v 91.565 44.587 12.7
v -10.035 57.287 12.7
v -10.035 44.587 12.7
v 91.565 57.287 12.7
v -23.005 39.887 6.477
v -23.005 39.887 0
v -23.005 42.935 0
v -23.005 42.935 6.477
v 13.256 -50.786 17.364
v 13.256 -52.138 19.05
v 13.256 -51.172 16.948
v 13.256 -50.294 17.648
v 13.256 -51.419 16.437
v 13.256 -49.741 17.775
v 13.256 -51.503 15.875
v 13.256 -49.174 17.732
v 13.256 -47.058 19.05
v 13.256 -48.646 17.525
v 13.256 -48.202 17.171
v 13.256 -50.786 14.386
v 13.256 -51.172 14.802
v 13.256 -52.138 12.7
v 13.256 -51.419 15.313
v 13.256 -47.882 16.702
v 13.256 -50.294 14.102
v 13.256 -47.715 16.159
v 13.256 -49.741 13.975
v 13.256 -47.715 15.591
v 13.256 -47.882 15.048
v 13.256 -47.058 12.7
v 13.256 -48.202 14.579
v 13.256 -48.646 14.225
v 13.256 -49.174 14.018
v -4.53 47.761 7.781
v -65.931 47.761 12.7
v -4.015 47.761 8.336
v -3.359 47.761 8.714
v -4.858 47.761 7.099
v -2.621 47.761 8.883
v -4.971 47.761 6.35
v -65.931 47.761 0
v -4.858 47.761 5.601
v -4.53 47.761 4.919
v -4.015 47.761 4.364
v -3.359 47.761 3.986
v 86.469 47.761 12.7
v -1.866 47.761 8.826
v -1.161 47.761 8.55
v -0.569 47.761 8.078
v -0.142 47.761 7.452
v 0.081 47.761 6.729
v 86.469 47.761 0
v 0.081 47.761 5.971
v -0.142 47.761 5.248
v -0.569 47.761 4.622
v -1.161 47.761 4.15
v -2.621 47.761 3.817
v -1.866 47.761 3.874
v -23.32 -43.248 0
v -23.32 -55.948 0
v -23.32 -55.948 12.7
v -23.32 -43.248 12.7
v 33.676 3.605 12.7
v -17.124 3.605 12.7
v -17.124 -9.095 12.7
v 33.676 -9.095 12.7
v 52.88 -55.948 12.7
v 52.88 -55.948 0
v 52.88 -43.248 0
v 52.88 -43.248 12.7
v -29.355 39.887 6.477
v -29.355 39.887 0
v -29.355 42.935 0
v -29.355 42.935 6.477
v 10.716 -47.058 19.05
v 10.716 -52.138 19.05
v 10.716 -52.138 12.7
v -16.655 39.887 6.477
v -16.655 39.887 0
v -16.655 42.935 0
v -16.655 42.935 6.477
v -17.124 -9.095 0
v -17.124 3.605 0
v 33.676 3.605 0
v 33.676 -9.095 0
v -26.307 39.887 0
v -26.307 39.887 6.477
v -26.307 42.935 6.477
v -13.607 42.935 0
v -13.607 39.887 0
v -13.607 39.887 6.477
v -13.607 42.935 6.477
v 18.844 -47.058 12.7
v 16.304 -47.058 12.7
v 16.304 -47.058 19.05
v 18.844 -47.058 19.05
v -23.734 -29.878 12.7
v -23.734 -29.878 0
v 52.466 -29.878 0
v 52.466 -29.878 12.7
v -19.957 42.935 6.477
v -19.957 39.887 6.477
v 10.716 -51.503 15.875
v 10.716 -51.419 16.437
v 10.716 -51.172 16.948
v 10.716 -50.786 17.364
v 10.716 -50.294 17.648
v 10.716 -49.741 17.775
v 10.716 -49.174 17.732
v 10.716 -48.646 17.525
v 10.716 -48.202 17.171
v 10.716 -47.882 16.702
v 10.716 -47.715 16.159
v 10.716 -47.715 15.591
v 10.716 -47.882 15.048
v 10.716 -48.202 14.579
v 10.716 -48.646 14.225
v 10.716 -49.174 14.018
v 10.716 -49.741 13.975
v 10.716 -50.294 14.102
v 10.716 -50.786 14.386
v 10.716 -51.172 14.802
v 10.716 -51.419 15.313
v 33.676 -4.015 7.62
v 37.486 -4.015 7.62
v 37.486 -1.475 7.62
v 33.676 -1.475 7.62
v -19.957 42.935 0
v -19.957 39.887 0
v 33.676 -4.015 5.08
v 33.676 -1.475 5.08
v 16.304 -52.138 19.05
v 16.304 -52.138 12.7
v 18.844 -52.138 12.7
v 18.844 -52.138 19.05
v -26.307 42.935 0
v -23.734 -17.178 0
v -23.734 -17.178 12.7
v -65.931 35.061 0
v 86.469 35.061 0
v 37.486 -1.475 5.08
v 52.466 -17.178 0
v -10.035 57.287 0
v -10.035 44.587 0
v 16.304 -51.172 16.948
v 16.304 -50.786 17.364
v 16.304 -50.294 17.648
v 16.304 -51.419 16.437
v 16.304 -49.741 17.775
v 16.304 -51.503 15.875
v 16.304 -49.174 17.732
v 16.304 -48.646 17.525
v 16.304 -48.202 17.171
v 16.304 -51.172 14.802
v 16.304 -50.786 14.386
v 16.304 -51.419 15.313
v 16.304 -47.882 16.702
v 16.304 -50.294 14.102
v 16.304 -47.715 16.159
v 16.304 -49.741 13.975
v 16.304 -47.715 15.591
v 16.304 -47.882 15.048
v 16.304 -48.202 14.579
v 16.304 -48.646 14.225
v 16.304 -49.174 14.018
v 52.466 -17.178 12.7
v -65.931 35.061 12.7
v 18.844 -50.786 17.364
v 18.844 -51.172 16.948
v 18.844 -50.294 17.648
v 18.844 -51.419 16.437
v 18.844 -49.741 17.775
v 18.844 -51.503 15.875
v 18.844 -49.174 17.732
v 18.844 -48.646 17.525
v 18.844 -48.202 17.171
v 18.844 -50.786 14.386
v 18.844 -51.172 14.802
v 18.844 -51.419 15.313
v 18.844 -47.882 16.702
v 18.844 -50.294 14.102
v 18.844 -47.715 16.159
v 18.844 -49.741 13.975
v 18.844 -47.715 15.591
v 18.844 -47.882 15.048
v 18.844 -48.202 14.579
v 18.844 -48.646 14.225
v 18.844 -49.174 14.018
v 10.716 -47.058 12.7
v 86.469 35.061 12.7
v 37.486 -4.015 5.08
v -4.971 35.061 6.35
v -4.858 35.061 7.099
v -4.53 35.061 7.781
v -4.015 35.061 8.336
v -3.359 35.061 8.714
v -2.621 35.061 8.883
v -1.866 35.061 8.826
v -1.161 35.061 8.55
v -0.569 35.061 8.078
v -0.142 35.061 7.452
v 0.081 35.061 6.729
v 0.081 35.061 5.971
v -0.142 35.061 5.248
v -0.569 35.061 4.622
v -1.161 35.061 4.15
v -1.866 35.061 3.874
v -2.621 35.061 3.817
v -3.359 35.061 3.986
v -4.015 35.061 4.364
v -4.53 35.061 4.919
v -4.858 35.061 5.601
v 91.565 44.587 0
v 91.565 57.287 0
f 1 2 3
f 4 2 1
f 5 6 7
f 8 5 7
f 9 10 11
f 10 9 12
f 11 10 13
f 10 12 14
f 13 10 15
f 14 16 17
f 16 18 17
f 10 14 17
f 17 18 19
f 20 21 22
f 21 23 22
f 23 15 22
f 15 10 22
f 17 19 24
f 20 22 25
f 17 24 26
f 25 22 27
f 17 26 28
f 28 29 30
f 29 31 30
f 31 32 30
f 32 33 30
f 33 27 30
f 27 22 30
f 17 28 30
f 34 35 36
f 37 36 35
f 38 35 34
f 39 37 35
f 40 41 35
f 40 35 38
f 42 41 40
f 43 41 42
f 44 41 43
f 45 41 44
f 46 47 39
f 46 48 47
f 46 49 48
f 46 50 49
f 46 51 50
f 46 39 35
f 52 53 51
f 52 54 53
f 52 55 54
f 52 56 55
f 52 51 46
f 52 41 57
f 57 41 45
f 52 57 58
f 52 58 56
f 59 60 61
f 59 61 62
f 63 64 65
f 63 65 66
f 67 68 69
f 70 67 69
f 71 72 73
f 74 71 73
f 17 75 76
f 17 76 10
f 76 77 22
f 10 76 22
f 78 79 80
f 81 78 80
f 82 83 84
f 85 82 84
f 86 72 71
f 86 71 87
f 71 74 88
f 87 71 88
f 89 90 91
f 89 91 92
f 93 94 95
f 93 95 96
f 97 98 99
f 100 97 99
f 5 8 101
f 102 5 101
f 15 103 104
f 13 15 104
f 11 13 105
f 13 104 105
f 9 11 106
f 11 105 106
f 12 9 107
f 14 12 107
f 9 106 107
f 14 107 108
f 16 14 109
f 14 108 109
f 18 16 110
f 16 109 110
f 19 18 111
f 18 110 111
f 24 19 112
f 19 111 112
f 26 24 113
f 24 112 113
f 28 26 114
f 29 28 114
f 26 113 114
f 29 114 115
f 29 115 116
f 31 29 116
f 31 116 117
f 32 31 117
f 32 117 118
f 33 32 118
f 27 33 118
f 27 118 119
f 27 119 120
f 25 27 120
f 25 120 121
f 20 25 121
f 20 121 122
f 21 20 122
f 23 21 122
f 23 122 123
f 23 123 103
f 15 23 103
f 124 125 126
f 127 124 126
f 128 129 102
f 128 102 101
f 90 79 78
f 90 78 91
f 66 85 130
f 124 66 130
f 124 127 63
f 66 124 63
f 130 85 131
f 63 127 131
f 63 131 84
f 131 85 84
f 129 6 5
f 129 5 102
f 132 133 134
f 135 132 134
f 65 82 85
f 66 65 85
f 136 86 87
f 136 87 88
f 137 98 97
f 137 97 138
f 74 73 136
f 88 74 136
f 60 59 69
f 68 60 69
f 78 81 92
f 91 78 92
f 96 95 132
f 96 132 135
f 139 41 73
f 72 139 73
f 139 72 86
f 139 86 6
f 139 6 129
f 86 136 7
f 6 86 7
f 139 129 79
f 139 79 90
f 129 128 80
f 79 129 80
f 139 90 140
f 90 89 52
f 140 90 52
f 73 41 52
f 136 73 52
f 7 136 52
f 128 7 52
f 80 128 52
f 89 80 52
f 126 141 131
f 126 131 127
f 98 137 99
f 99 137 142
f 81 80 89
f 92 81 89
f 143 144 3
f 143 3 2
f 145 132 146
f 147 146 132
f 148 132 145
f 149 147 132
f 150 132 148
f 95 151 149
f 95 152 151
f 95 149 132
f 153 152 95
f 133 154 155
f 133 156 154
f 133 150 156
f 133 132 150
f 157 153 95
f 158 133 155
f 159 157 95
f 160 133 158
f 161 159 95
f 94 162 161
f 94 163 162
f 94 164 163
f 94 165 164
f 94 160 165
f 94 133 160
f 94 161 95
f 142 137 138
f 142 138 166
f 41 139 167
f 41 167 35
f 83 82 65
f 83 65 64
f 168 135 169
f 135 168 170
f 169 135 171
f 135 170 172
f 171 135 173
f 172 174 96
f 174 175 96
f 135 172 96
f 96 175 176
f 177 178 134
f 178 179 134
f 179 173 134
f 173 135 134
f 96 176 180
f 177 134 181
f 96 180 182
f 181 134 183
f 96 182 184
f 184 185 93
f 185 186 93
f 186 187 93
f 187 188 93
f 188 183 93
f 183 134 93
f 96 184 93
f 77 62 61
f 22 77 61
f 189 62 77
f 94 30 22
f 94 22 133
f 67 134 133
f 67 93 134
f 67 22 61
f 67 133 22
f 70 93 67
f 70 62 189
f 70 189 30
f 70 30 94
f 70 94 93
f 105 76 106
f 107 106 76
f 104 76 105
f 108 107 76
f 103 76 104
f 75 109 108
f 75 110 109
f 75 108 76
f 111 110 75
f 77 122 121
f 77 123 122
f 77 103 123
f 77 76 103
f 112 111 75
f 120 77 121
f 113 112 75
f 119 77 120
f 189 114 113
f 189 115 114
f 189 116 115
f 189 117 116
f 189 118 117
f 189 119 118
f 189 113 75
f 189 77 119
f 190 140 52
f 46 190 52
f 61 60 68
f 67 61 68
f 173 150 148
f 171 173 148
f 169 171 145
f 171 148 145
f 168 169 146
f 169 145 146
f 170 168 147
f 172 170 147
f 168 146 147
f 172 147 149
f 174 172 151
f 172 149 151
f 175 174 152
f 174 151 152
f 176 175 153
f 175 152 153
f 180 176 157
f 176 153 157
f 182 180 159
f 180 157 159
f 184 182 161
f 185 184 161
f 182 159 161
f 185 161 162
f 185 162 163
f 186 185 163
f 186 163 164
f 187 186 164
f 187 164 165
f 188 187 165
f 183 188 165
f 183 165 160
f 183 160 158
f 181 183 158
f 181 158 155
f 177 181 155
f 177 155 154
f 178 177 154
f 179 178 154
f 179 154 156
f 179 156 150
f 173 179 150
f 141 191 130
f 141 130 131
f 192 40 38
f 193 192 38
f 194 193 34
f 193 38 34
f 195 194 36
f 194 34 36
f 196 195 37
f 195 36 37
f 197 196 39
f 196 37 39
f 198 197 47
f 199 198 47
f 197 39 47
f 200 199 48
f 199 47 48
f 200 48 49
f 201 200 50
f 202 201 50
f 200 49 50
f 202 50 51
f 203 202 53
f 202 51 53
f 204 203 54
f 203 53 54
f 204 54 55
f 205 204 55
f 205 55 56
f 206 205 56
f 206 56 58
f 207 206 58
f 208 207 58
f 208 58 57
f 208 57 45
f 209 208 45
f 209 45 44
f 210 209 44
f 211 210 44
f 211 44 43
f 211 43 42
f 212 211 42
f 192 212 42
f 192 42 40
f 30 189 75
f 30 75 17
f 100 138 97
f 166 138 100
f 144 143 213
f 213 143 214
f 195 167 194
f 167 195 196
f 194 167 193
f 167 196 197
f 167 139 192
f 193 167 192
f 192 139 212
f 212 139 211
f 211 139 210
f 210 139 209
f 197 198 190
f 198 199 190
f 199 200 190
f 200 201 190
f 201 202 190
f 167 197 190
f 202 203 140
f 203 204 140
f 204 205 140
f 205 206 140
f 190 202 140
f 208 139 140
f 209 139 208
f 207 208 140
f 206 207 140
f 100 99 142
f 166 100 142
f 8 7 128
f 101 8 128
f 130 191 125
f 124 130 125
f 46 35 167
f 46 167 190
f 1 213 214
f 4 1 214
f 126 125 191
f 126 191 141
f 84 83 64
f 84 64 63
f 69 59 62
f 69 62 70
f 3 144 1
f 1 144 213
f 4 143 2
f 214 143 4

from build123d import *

# Parameters (mm, degrees)
F0_W      = 152.4
F0_H      = 12.7
F1_DEPTH  = 12.7
F2_W      = 76.2
F2_H      = 12.7
F3_DEPTH  = 12.7
F4_W      = 101.6
F4_H      = 12.7
F6_DEPTH  = 12.7
F5_W      = 50.8
F5_H      = 12.7
F8_D      = 5.08
F9_W      = 2.54
F9_H      = 2.54
F10_DEPTH = 3.81
F11_W     = 3.048
F11_H     = 3.048
F12_DEPTH = 6.477
F13_DEPTH = 6.477
F14_DEPTH = 6.477
F15_W     = 76.2
F15_H     = 12.7
F16_DEPTH = 12.7
F17_W     = 2.54
F17_H     = 5.08
F18_DEPTH = 6.35
F19_DEPTH = 6.35
F20_R     = 1.905
F21_DEPTH = 10.668


with BuildPart() as f1:
    # F0 (on Top) → F1 (new body)
    with BuildSketch(Plane.XY):
        with Locations((10.2690905333, 41.4107435818)):
            Rectangle(F0_W, F0_H)
    extrude(amount=F1_DEPTH)

    # F8 (through all)
    with Locations(Plane.XZ.offset(-35.0607435818)):
        with Locations((-2.4309094667, 6.35)):
            Hole(F8_D / 2)

    # F11 (on face) → F12 (cut)
    with BuildSketch(Plane.XY):
        with Locations((-21.4809094667, 41.4107435818)):
            Rectangle(F11_W, F11_H)
    extrude(amount=F12_DEPTH, mode=Mode.SUBTRACT)

    # F11 (on face) → F13 (cut)
    with BuildSketch(Plane.XY):
        with Locations((-15.1309094667, 41.4107435818)):
            Rectangle(F11_W, F11_H)
    extrude(amount=F13_DEPTH, mode=Mode.SUBTRACT)

    # F11 (on face) → F14 (cut)
    with BuildSketch(Plane.XY):
        with Locations((-27.8309094667, 41.4107435818)):
            Rectangle(F11_W, F11_H)
    extrude(amount=F14_DEPTH, mode=Mode.SUBTRACT)


with BuildPart() as f3:
    # F2 (on Top) → F3 (new body)
    with BuildSketch(Plane.XY):
        with Locations((14.3660753965, -23.5283830105)):
            Rectangle(F2_W, F2_H)
    extrude(amount=F3_DEPTH)


with BuildPart() as f6:
    # F4 (on Top) → F6 (new body)
    with BuildSketch(Plane.XY):
        with Locations((40.7652929425, 50.9374617809)):
            Rectangle(F4_W, F4_H)
    extrude(amount=F6_DEPTH)


with BuildPart() as f6b:
    # F5 (on Top) → F6, piece 2 (new body)
    with BuildSketch(Plane.XY):
        with Locations((8.2757057786, -2.7452047178)):
            Rectangle(F5_W, F5_H)
    extrude(amount=F6_DEPTH)

    # F9 (on face) → F10 (join)
    with BuildSketch(Plane.YZ.offset(33.6757057786)):
        with Locations((-2.7452047178, 6.35)):
            Rectangle(F9_W, F9_H)
    extrude(amount=F10_DEPTH)


with BuildPart() as f16:
    # F15 (on Top) → F16 (new body)
    with BuildSketch(Plane.XY):
        with Locations((14.7796703373, -49.5983362198)):
            Rectangle(F15_W, F15_H)
    extrude(amount=F16_DEPTH)

    # F17 (on face) → F18 (join)
    with BuildSketch(Plane.XY.offset(12.7)):
        with Locations((11.9856703373, -49.5983362198)):
            Rectangle(F17_W, F17_H)
    extrude(amount=F18_DEPTH)

    # F17 (on face) → F19 (join)
    with BuildSketch(Plane.XY.offset(12.7)):
        with Locations((17.5736703373, -49.5983362198)):
            Rectangle(F17_W, F17_H)
    extrude(amount=F19_DEPTH)

    # F20 (on face) → F21 (cut)
    with BuildSketch(Plane(origin=(10.7156703373, 0, 0), x_dir=(0, -1, 0), z_dir=(-1, 0, 0))):
        with Locations((49.5983362198, 15.875)):
            Circle(F20_R)
    extrude(amount=-F21_DEPTH, mode=Mode.SUBTRACT)


solid = Compound([f1.part, f3.part, f6.part, f6b.part, f16.part])
